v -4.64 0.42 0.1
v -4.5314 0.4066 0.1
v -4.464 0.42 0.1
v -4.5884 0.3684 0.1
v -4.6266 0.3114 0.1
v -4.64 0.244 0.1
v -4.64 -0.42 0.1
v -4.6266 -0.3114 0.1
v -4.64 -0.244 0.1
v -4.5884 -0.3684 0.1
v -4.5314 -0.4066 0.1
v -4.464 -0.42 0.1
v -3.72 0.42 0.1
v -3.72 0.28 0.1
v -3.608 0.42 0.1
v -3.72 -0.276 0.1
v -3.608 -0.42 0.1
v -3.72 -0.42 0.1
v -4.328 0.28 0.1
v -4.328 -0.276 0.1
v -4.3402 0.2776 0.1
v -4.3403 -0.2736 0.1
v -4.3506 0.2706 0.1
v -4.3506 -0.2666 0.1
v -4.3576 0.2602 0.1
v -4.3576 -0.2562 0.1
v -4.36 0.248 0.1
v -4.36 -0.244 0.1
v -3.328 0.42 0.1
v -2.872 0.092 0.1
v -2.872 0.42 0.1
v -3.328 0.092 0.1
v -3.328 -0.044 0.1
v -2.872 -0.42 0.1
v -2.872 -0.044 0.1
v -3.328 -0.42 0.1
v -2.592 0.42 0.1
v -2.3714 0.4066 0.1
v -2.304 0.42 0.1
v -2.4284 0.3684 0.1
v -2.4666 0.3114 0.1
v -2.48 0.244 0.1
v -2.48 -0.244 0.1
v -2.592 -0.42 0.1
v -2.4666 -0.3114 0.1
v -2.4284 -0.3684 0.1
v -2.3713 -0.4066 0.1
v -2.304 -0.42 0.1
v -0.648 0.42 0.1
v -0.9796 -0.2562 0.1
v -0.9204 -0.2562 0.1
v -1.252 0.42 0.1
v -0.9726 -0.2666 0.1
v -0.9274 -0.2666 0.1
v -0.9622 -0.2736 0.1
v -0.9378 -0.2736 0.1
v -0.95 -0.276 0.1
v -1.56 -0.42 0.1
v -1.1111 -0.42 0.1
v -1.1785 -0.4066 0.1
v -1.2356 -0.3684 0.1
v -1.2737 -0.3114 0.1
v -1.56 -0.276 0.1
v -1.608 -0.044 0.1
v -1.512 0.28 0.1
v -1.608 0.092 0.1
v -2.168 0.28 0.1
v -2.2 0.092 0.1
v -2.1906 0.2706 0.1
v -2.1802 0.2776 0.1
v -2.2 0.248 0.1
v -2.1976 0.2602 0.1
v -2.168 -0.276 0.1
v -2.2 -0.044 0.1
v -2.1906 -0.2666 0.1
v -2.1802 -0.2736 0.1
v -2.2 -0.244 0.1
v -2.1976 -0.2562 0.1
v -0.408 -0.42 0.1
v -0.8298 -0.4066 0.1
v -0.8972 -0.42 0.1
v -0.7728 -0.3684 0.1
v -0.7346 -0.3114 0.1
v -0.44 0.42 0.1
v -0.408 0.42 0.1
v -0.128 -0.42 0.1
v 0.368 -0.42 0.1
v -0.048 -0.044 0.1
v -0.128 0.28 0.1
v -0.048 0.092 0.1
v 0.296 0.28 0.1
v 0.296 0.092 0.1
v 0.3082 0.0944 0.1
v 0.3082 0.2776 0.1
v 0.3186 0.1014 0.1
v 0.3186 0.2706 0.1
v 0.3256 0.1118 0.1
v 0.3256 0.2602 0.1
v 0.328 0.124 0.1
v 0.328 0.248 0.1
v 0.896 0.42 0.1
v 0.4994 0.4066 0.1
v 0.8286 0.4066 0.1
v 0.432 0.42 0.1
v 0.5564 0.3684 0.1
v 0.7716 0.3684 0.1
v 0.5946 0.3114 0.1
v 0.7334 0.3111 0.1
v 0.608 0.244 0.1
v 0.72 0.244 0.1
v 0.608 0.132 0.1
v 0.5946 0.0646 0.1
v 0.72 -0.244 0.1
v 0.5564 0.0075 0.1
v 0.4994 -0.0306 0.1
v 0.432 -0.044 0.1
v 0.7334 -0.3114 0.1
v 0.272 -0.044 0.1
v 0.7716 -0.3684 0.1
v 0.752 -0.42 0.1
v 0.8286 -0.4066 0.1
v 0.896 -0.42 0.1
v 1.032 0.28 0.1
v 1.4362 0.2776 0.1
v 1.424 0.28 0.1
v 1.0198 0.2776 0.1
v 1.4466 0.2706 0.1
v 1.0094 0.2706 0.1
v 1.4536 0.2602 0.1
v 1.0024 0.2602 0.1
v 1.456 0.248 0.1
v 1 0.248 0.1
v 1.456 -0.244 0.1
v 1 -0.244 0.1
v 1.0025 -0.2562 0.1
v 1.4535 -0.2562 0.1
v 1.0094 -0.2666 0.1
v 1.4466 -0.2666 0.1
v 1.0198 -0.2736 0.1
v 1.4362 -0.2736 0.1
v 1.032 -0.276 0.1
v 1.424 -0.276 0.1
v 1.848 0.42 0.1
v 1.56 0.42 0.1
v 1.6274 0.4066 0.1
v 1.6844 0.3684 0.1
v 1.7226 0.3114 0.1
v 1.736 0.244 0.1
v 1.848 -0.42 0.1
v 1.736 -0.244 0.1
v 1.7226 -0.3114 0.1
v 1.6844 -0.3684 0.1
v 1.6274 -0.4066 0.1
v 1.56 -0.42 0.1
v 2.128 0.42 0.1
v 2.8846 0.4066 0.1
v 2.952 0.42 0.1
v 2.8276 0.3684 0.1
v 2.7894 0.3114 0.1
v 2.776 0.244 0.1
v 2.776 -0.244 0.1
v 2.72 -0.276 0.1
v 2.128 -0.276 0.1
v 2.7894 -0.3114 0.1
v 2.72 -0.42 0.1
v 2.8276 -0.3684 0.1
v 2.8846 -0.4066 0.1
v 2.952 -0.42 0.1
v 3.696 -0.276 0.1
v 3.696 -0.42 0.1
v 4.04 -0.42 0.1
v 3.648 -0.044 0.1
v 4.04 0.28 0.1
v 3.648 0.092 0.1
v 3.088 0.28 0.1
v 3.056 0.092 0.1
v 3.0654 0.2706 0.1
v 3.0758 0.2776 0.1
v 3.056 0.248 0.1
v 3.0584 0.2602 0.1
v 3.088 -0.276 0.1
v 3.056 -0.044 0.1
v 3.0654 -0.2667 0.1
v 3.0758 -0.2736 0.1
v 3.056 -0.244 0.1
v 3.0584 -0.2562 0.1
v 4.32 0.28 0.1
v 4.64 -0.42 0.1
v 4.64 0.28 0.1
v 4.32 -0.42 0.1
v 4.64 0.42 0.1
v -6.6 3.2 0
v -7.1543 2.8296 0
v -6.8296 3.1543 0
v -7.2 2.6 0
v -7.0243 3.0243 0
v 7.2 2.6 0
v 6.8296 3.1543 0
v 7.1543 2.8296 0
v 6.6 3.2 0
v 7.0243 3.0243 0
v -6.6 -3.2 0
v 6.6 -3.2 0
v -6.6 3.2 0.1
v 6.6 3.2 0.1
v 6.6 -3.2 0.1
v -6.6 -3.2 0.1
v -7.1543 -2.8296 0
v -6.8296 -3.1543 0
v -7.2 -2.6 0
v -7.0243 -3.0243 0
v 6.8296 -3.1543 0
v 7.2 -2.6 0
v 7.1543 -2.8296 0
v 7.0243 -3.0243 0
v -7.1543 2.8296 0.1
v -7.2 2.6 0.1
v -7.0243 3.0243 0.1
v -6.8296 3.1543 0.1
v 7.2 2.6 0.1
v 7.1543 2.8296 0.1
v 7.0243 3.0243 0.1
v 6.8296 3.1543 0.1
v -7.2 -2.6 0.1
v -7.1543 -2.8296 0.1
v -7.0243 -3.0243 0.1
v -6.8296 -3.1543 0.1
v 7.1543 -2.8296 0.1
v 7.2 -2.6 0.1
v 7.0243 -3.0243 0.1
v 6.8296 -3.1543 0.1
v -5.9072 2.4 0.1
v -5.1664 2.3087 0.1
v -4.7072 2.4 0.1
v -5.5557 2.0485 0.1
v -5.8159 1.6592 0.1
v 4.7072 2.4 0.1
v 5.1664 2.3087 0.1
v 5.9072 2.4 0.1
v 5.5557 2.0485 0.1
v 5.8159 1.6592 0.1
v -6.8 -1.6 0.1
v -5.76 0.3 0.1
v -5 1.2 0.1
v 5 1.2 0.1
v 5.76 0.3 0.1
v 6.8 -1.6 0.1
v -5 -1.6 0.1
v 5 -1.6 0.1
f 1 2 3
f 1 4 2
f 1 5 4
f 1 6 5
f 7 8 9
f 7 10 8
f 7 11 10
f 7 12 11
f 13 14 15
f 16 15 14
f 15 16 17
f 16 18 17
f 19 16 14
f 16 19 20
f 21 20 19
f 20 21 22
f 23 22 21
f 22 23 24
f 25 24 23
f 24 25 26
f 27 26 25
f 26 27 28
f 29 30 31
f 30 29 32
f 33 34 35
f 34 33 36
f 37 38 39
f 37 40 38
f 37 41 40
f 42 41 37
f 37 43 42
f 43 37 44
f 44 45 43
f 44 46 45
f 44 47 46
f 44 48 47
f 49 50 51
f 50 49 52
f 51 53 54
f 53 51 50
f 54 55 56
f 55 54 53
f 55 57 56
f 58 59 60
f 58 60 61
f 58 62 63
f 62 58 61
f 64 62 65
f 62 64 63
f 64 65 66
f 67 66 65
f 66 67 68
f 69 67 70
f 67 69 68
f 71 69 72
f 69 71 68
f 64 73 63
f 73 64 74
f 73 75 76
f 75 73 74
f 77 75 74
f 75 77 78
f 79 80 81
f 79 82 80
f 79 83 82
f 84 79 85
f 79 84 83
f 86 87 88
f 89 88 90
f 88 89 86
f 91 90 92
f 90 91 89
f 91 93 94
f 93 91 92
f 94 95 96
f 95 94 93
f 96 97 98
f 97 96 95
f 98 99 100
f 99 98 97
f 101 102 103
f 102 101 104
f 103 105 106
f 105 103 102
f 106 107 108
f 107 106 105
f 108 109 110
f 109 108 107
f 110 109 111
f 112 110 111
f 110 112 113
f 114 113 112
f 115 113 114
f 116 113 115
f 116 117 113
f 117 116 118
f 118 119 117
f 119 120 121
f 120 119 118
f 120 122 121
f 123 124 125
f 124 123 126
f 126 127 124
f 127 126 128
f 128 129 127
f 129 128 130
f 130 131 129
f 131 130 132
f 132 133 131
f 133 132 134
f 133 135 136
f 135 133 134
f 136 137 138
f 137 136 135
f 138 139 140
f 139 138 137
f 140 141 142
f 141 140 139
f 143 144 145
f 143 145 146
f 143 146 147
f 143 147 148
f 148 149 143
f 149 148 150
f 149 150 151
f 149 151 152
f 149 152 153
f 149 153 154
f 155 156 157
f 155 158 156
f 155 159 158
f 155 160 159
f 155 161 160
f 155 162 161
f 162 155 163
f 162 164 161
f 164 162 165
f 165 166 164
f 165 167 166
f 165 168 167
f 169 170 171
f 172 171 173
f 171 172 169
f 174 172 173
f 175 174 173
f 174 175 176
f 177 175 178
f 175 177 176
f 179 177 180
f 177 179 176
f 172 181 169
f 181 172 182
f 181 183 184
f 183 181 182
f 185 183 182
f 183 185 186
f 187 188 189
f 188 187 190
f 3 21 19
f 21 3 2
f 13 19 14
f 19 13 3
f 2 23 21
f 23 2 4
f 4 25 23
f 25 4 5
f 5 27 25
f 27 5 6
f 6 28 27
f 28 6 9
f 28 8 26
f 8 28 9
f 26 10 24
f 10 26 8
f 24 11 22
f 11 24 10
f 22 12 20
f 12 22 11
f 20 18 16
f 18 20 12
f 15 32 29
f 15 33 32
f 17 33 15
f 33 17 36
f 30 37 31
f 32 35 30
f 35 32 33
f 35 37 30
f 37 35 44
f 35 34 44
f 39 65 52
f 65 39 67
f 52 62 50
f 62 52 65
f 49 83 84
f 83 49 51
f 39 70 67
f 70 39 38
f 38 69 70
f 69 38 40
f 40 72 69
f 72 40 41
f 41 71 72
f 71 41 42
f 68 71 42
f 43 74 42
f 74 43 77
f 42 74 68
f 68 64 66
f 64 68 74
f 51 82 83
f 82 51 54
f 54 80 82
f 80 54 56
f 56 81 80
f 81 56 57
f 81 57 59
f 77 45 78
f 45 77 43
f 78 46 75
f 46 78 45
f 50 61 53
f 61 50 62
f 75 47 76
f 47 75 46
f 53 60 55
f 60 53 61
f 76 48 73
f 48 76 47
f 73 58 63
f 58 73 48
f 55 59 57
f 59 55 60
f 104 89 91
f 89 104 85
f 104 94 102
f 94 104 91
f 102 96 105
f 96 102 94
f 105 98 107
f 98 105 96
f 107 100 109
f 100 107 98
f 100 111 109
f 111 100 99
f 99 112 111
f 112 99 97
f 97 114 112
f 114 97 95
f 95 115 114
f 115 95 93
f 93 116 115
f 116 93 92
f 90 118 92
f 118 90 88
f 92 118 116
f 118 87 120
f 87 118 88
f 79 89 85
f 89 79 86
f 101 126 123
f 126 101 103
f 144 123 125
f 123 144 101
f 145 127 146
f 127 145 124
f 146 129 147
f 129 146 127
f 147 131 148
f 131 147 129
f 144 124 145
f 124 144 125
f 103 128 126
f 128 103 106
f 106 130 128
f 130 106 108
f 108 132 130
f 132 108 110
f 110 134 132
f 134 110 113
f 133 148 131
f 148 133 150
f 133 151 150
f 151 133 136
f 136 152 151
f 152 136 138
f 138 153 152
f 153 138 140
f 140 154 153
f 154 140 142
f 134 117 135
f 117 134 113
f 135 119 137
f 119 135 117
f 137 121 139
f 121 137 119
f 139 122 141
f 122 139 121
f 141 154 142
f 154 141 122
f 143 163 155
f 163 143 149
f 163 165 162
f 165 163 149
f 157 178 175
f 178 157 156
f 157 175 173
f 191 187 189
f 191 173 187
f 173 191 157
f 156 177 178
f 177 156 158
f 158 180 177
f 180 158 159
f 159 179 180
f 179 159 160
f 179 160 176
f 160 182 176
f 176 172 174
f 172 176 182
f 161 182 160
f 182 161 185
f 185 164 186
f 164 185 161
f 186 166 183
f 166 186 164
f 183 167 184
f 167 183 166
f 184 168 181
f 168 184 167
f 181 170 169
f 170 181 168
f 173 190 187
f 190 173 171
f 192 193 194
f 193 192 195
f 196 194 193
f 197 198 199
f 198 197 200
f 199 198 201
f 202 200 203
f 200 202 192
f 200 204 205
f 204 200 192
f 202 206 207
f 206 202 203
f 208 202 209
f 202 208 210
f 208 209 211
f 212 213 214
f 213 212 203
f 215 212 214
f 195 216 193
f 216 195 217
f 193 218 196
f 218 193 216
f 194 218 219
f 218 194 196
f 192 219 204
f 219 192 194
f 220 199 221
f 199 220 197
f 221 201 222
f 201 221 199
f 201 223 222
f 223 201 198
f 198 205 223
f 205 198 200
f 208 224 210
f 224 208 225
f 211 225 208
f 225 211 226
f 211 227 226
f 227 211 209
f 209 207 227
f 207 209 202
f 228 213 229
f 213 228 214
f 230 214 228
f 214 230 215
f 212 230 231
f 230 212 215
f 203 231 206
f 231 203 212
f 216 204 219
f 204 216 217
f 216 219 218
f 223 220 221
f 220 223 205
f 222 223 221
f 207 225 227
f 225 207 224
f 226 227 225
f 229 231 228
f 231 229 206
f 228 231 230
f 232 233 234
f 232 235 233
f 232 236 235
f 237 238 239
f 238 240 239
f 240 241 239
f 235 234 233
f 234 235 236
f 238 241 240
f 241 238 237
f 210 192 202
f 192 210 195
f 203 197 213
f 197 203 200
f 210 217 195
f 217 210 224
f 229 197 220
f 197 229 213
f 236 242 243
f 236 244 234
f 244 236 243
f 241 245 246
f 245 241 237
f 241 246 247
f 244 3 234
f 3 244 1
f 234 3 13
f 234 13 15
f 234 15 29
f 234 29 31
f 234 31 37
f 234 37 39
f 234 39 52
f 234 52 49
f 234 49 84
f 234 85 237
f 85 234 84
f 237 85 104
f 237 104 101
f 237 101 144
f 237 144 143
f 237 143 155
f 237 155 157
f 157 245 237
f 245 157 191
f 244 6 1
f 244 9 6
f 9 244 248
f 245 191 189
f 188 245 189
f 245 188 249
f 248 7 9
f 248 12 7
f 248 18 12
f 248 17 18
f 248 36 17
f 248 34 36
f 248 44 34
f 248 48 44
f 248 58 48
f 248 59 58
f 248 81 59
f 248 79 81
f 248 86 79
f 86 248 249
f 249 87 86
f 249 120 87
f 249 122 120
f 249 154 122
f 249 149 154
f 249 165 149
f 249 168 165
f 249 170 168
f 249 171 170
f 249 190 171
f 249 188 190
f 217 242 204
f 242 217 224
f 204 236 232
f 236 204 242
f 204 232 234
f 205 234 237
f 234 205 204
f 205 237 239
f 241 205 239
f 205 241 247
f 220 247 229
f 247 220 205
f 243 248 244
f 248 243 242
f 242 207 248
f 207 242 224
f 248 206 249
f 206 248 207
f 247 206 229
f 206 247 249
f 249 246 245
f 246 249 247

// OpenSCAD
// file: ../p/box3u12.scad
use <../lib.scad>
function ldraw_lib__box3u12() = [
// 0 Box with 3 Parallel Faces without Any Edges
// 0 Name: box3u12.dat
// 0 Author: J.C. Tchang [tchang]
// 0 !LDRAW_ORG Primitive UPDATE 2014-02
// 0 !LICENSE Licensed under CC BY 4.0 : see CAreadme.txt
// 
// 0 BFC CERTIFY CCW
  [0,"BFC","CERTIFY"],
  [0,"BFC","CCW"],
// 
// 0 !HISTORY 2014-12-23 [PTadmin] Official Update 2014-02
// 
// 
// 4 16 -1 1 1 1 1 1 1 1 -1 -1 1 -1
  [4,16,-1,1,1,1,1,1,1,1,-1,-1,1,-1],
// 4 16 -1 1 1 -1 0 1 1 0 1 1 1 1
  [4,16,-1,1,1,-1,0,1,1,0,1,1,1,1],
// 4 16 1 1 -1 1 0 -1 -1 0 -1 -1 1 -1
  [4,16,1,1,-1,1,0,-1,-1,0,-1,-1,1,-1],
];
module ldraw_lib__box3u12(step=0, col=false, unit=2/5, alt=false, line=0.2, solid=!$preview)
    makepoly(ldraw_lib__box3u12(), step=step, col=col, unit=unit, alt=alt, line=line, solid=solid);
ldraw_lib__box3u12(line=0.2);
// file: ../p/3-16ndis.scad
use <../lib.scad>
function ldraw_lib__3_16ndis() = [
// 0 Disc Negative 0.1875
// 0 Name: 3-16ndis.dat
// 0 Author: Guy Vivan [guyvivan]
// 0 !LDRAW_ORG Primitive UPDATE 2009-01
// 0 !LICENSE Licensed under CC BY 2.0 and CC BY 4.0 : see CAreadme.txt
// 
// 0 BFC CERTIFY CCW
  [0,"BFC","CERTIFY"],
  [0,"BFC","CCW"],
// 
// 0 !HISTORY 2009-05-02 [PTadmin] Official Update 2009-01
// 
// 
// 3 16 1 0 1 0.9239 0 0.3827 1 0 0
  [3,16,1,0,1,0.9239,0,0.3827,1,0,0],
// 3 16 1 0 1 0.7071 0 0.7071 0.9239 0 0.3827
  [3,16,1,0,1,0.7071,0,0.7071,0.9239,0,0.3827],
// 3 16 1 0 1 0.3827 0 0.9239 0.7071 0 0.7071
  [3,16,1,0,1,0.3827,0,0.9239,0.7071,0,0.7071],
// 
// 0 end of file
// 
];
module ldraw_lib__3_16ndis(step=0, col=false, unit=2/5, alt=false, line=0.2, solid=!$preview)
    makepoly(ldraw_lib__3_16ndis(), step=step, col=col, unit=unit, alt=alt, line=line, solid=solid);
ldraw_lib__3_16ndis(line=0.2);
// file: ../p/3-16chrd.scad
use <../lib.scad>
function ldraw_lib__3_16chrd() = [
// 0 Chord 0.1875
// 0 Name: 3-16chrd.dat
// 0 Author: Niels Karsdorp [nielsk]
// 0 !LDRAW_ORG Primitive UPDATE 2009-01
// 0 !LICENSE Licensed under CC BY 4.0 : see CAreadme.txt
// 
// 0 BFC CERTIFY CCW
  [0,"BFC","CERTIFY"],
  [0,"BFC","CCW"],
// 
// 0 !HISTORY 2009-05-02 [PTadmin] Official Update 2009-01
// 
// 
// 4 16 1 0 0 0.9239 0 0.3827 0.7071 0 0.7071 0.3827 0 0.9239
  [4,16,1,0,0,0.9239,0,0.3827,0.7071,0,0.7071,0.3827,0,0.9239],
// 0
// 
];
module ldraw_lib__3_16chrd(step=0, col=false, unit=2/5, alt=false, line=0.2, solid=!$preview)
    makepoly(ldraw_lib__3_16chrd(), step=step, col=col, unit=unit, alt=alt, line=line, solid=solid);
ldraw_lib__3_16chrd(line=0.2);
// file: ../p/1-4cyli.scad
use <../lib.scad>
function ldraw_lib__1_4cyli() = [
// 0 Cylinder 0.25
// 0 Name: 1-4cyli.dat
// 0 Author: James Jessiman
// 0 !LDRAW_ORG Primitive UPDATE 2012-01
// 0 !LICENSE Licensed under CC BY 4.0 : see CAreadme.txt
// 
// 0 BFC CERTIFY CCW
  [0,"BFC","CERTIFY"],
  [0,"BFC","CCW"],
// 
// 0 !HISTORY 2002-03-23 [sbliss] Added BFC statement.
// 0 !HISTORY 2002-04-25 [PTadmin] Official Update 2002-02
// 0 !HISTORY 2007-06-22 [PTadmin] Header formatted for Contributor Agreement
// 0 !HISTORY 2008-07-01 [PTadmin] Official Update 2008-01
// 0 !HISTORY 2012-02-16 [Philo] Changed to CCW
// 0 !HISTORY 2012-03-30 [PTadmin] Official Update 2012-01
// 
// 
// 4 16 1 1 0 0.9239 1 0.3827 0.9239 0 0.3827 1 0 0
  [4,16,1,1,0,0.9239,1,0.3827,0.9239,0,0.3827,1,0,0],
// 5 24 1 0 0 1 1 0 0.9239 0 0.3827 1 0 -1
  [5,24,1,0,0,1,1,0,0.9239,0,0.3827,1,0,-1],
// 4 16 0.9239 1 0.3827 0.7071 1 0.7071 0.7071 0 0.7071 0.9239 0 0.3827
  [4,16,0.9239,1,0.3827,0.7071,1,0.7071,0.7071,0,0.7071,0.9239,0,0.3827],
// 5 24 0.9239 0 0.3827 0.9239 1 0.3827 0.7071 0 0.7071 1 0 0
  [5,24,0.9239,0,0.3827,0.9239,1,0.3827,0.7071,0,0.7071,1,0,0],
// 4 16 0.7071 1 0.7071 0.3827 1 0.9239 0.3827 0 0.9239 0.7071 0 0.7071
  [4,16,0.7071,1,0.7071,0.3827,1,0.9239,0.3827,0,0.9239,0.7071,0,0.7071],
// 5 24 0.7071 0 0.7071 0.7071 1 0.7071 0.3827 0 0.9239 0.9239 0 0.3827
  [5,24,0.7071,0,0.7071,0.7071,1,0.7071,0.3827,0,0.9239,0.9239,0,0.3827],
// 4 16 0.3827 1 0.9239 0 1 1 0 0 1 0.3827 0 0.9239
  [4,16,0.3827,1,0.9239,0,1,1,0,0,1,0.3827,0,0.9239],
// 5 24 0.3827 0 0.9239 0.3827 1 0.9239 0 0 1 0.7071 0 0.7071
  [5,24,0.3827,0,0.9239,0.3827,1,0.9239,0,0,1,0.7071,0,0.7071],
// 5 24 0 0 1 0 1 1 0.3827 0 0.9239 -1 0 1
  [5,24,0,0,1,0,1,1,0.3827,0,0.9239,-1,0,1],
];
module ldraw_lib__1_4cyli(step=0, col=false, unit=2/5, alt=false, line=0.2, solid=!$preview)
    makepoly(ldraw_lib__1_4cyli(), step=step, col=col, unit=unit, alt=alt, line=line, solid=solid);
ldraw_lib__1_4cyli(line=0.2);
// file: ../p/1-4chrd.scad
use <../lib.scad>
function ldraw_lib__1_4chrd() = [
// 0 Chord 0.25
// 0 Name: 1-4chrd.dat
// 0 Author: Max Martin Richter [MMR1988]
// 0 !LDRAW_ORG Primitive UPDATE 2023-05
// 0 !LICENSE Licensed under CC BY 4.0 : see CAreadme.txt
// 
// 0 BFC CERTIFY CCW
  [0,"BFC","CERTIFY"],
  [0,"BFC","CCW"],
// 
// 0 !HISTORY 2004-04-22 [PTadmin] Official Update 2004-02
// 0 !HISTORY 2007-10-09 [PTadmin] Header formatted for Contributor Agreement
// 0 !HISTORY 2008-07-01 [PTadmin] Official Update 2008-01
// 0 !HISTORY 2012-08-02 [MMR1988] Re-creation with PrimGen2 and Rectifier
// 0 !HISTORY 2012-08-09 [PTadmin] Official Update 2012-02
// 0 !HISTORY 2023-10-27 [OrionP] Change author to MMR1988 from hafhead
// 0 !HISTORY 2023-10-31 [OrionP] Official Update 2023-05
// 
// 4 16 0.9239 0 0.3827 0.3827 0 0.9239 0 0 1 1 0 0
  [4,16,0.9239,0,0.3827,0.3827,0,0.9239,0,0,1,1,0,0],
// 3 16 0.7071 0 0.7071 0.3827 0 0.9239 0.9239 0 0.3827
  [3,16,0.7071,0,0.7071,0.3827,0,0.9239,0.9239,0,0.3827],
];
module ldraw_lib__1_4chrd(step=0, col=false, unit=2/5, alt=false, line=0.2, solid=!$preview)
    makepoly(ldraw_lib__1_4chrd(), step=step, col=col, unit=unit, alt=alt, line=line, solid=solid);
ldraw_lib__1_4chrd(line=0.2);
// main file
use <../lib.scad>
use <../p/1-4chrd.scad>
use <../p/1-4cyli.scad>
use <../p/3-16chrd.scad>
use <../p/3-16ndis.scad>
use <../p/box3u12.scad>
use <../p/logo-chevrolet-text-box.scad>
use <../p/logo-chevrolet-text.scad>
function ldraw_lib__6142617r() = [
// 0 Sticker  0.9 x  1.8 with Silver "Chevrolet" in Black Frame on Red Background
// 0 Name: 6142617r.dat
// 0 Author: Massimo Maso [Sirio]
// 0 !LDRAW_ORG Part UPDATE 2023-05
// 0 !LICENSE Licensed under CC BY 4.0 : see CAreadme.txt
// 
// 0 BFC CERTIFY CCW
  [0,"BFC","CERTIFY"],
  [0,"BFC","CCW"],
// 
// 0 !KEYWORDS Camaro, Drag, Race, Set 75874, Speed Champions, SS
// 
// 0 !HISTORY 2023-10-31 [OrionP] Official Update 2023-05
// 
// 
// 1 0 0 -.25 0 .4 0 0 0 1 0 0 0 .4 logo-chevrolet-text-box.dat
  [1,0,0,-.25,0,.4,0,0,0,1,0,0,0,.4, ldraw_lib__logo_chevrolet_text_box()],
// 1 80 0 -.25 0 .4 0 0 0 1 0 0 0 .4 logo-chevrolet-text.dat
  [1,80,0,-.25,0,.4,0,0,0,1,0,0,0,.4, ldraw_lib__logo_chevrolet_text()],
// 0 // Primitives
// 1 16 -16.5 0 6.5 -1.5 0 0 0 -1 0 0 0 1.5 1-4chrd.dat
  [1,16,-16.5,0,6.5,-1.5,0,0,0,-1,0,0,0,1.5, ldraw_lib__1_4chrd()],
// 1 16 16.5 0 6.5 1.5 0 0 0 -1 0 0 0 1.5 1-4chrd.dat
  [1,16,16.5,0,6.5,1.5,0,0,0,-1,0,0,0,1.5, ldraw_lib__1_4chrd()],
// 1 16 0 -.25 0 16.5 0 0 0 .25 0 0 0 8 box3u12.dat
  [1,16,0,-.25,0,16.5,0,0,0,.25,0,0,0,8, ldraw_lib__box3u12()],
// 1 16 -16.5 0 -6.5 -1.5 0 0 0 -1 0 0 0 -1.5 1-4chrd.dat
  [1,16,-16.5,0,-6.5,-1.5,0,0,0,-1,0,0,0,-1.5, ldraw_lib__1_4chrd()],
// 1 16 16.5 0 -6.5 1.5 0 0 0 -1 0 0 0 -1.5 1-4chrd.dat
  [1,16,16.5,0,-6.5,1.5,0,0,0,-1,0,0,0,-1.5, ldraw_lib__1_4chrd()],
// 1 16 -16.5 0 6.5 -1.5 0 0 0 -.25 0 0 0 1.5 1-4cyli.dat
  [1,16,-16.5,0,6.5,-1.5,0,0,0,-.25,0,0,0,1.5, ldraw_lib__1_4cyli()],
// 1 16 16.5 0 6.5 1.5 0 0 0 -.25 0 0 0 1.5 1-4cyli.dat
  [1,16,16.5,0,6.5,1.5,0,0,0,-.25,0,0,0,1.5, ldraw_lib__1_4cyli()],
// 1 16 -16.5 0 -6.5 -1.5 0 0 0 -.25 0 0 0 -1.5 1-4cyli.dat
  [1,16,-16.5,0,-6.5,-1.5,0,0,0,-.25,0,0,0,-1.5, ldraw_lib__1_4cyli()],
// 1 16 16.5 0 -6.5 1.5 0 0 0 -.25 0 0 0 -1.5 1-4cyli.dat
  [1,16,16.5,0,-6.5,1.5,0,0,0,-.25,0,0,0,-1.5, ldraw_lib__1_4cyli()],
// 1 4 -16.5 -.25 6.5 -1.5 0 0 0 1 0 0 0 1.5 1-4chrd.dat
  [1,4,-16.5,-.25,6.5,-1.5,0,0,0,1,0,0,0,1.5, ldraw_lib__1_4chrd()],
// 1 4 16.5 -.25 6.5 1.5 0 0 0 1 0 0 0 1.5 1-4chrd.dat
  [1,4,16.5,-.25,6.5,1.5,0,0,0,1,0,0,0,1.5, ldraw_lib__1_4chrd()],
// 1 4 -16.5 -.25 -6.5 -1.5 0 0 0 1 0 0 0 -1.5 1-4chrd.dat
  [1,4,-16.5,-.25,-6.5,-1.5,0,0,0,1,0,0,0,-1.5, ldraw_lib__1_4chrd()],
// 1 4 16.5 -.25 -6.5 1.5 0 0 0 1 0 0 0 -1.5 1-4chrd.dat
  [1,4,16.5,-.25,-6.5,1.5,0,0,0,1,0,0,0,-1.5, ldraw_lib__1_4chrd()],
// 1 4 -11.768 -.25 3 0 0 -3 0 1 0 3 0 0 3-16ndis.dat
  [1,4,-11.768,-.25,3,0,0,-3,0,1,0,3,0,0, ldraw_lib__3_16ndis()],
// 1 4 11.768 -.25 3 0 0 3 0 1 0 3 0 0 3-16ndis.dat
  [1,4,11.768,-.25,3,0,0,3,0,1,0,3,0,0, ldraw_lib__3_16ndis()],
// 1 0 -11.768 -.25 3 0 0 -3 0 1 0 3 0 0 3-16chrd.dat
  [1,0,-11.768,-.25,3,0,0,-3,0,1,0,3,0,0, ldraw_lib__3_16chrd()],
// 1 0 11.768 -.25 3 0 0 3 0 1 0 3 0 0 3-16chrd.dat
  [1,0,11.768,-.25,3,0,0,3,0,1,0,3,0,0, ldraw_lib__3_16chrd()],
// 0 // Bottom face
// 4 16 -16.5 0 8 -16.5 0 -8 -18 0 -6.5 -18 0 6.5
  [4,16,-16.5,0,8,-16.5,0,-8,-18,0,-6.5,-18,0,6.5],
// 4 16 16.5 0 8 18 0 6.5 18 0 -6.5 16.5 0 -8
  [4,16,16.5,0,8,18,0,6.5,18,0,-6.5,16.5,0,-8],
// 0 // Lateral face
// 4 16 -18 0 6.5 -18 0 -6.5 -18 -.25 -6.5 -18 -.25 6.5
  [4,16,-18,0,6.5,-18,0,-6.5,-18,-.25,-6.5,-18,-.25,6.5],
// 4 16 18 0 6.5 18 -.25 6.5 18 -.25 -6.5 18 0 -6.5
  [4,16,18,0,6.5,18,-.25,6.5,18,-.25,-6.5,18,0,-6.5],
// 0 // Top face
// 0 // Black faces
// 3 0 -14.5397 -.25 4.1481 -17 -.25 -4 -14.4 -.25 .75
  [3,0,-14.5397,-.25,4.1481,-17,-.25,-4,-14.4,-.25,.75],
// 4 0 -14.5397 -.25 4.1481 -14.4 -.25 .75 -12.5 -.25 3 -11.768 -.25 6
  [4,0,-14.5397,-.25,4.1481,-14.4,-.25,.75,-12.5,-.25,3,-11.768,-.25,6],
// 4 0 14.5397 -.25 4.1481 11.768 -.25 6 12.5 -.25 3 14.4 -.25 .75
  [4,0,14.5397,-.25,4.1481,11.768,-.25,6,12.5,-.25,3,14.4,-.25,.75],
// 3 0 14.5397 -.25 4.1481 14.4 -.25 .75 17 -.25 -4
  [3,0,14.5397,-.25,4.1481,14.4,-.25,.75,17,-.25,-4],
// 4 0 -11.768 -.25 6 -12.5 -.25 3 -11.6 -.25 1.05 -11.16 -.25 1.05
  [4,0,-11.768,-.25,6,-12.5,-.25,3,-11.6,-.25,1.05,-11.16,-.25,1.05],
// 3 0 -11.768 -.25 6 -11.16 -.25 1.05 -9.3 -.25 1.05
  [3,0,-11.768,-.25,6,-11.16,-.25,1.05,-9.3,-.25,1.05],
// 3 0 -11.768 -.25 6 -9.3 -.25 1.05 -9.02 -.25 1.05
  [3,0,-11.768,-.25,6,-9.3,-.25,1.05,-9.02,-.25,1.05],
// 3 0 -11.768 -.25 6 -9.02 -.25 1.05 -8.32 -.25 1.05
  [3,0,-11.768,-.25,6,-9.02,-.25,1.05,-8.32,-.25,1.05],
// 3 0 -11.768 -.25 6 -8.32 -.25 1.05 -7.18 -.25 1.05
  [3,0,-11.768,-.25,6,-8.32,-.25,1.05,-7.18,-.25,1.05],
// 3 0 -11.768 -.25 6 -7.18 -.25 1.05 -6.48 -.25 1.05
  [3,0,-11.768,-.25,6,-7.18,-.25,1.05,-6.48,-.25,1.05],
// 3 0 -11.768 -.25 6 -6.48 -.25 1.05 -5.76 -.25 1.05
  [3,0,-11.768,-.25,6,-6.48,-.25,1.05,-5.76,-.25,1.05],
// 3 0 -11.768 -.25 6 -5.76 -.25 1.05 -3.13 -.25 1.05
  [3,0,-11.768,-.25,6,-5.76,-.25,1.05,-3.13,-.25,1.05],
// 3 0 -11.768 -.25 6 -3.13 -.25 1.05 -1.62 -.25 1.05
  [3,0,-11.768,-.25,6,-3.13,-.25,1.05,-1.62,-.25,1.05],
// 3 0 -11.768 -.25 6 -1.62 -.25 1.05 -1.1 -.25 1.05
  [3,0,-11.768,-.25,6,-1.62,-.25,1.05,-1.1,-.25,1.05],
// 4 0 -11.768 -.25 6 -1.1 -.25 1.05 -1.02 -.25 1.05 11.768 -.25 6
  [4,0,-11.768,-.25,6,-1.1,-.25,1.05,-1.02,-.25,1.05,11.768,-.25,6],
// 3 0 11.768 -.25 6 -1.02 -.25 1.05 1.08 -.25 1.05
  [3,0,11.768,-.25,6,-1.02,-.25,1.05,1.08,-.25,1.05],
// 3 0 11.768 -.25 6 1.08 -.25 1.05 2.24 -.25 1.05
  [3,0,11.768,-.25,6,1.08,-.25,1.05,2.24,-.25,1.05],
// 3 0 11.768 -.25 6 2.24 -.25 1.05 3.9 -.25 1.05
  [3,0,11.768,-.25,6,2.24,-.25,1.05,3.9,-.25,1.05],
// 3 0 11.768 -.25 6 3.9 -.25 1.05 4.62 -.25 1.05
  [3,0,11.768,-.25,6,3.9,-.25,1.05,4.62,-.25,1.05],
// 3 0 11.768 -.25 6 4.62 -.25 1.05 5.32 -.25 1.05
  [3,0,11.768,-.25,6,4.62,-.25,1.05,5.32,-.25,1.05],
// 3 0 11.768 -.25 6 5.32 -.25 1.05 7.38 -.25 1.05
  [3,0,11.768,-.25,6,5.32,-.25,1.05,7.38,-.25,1.05],
// 4 0 11.768 -.25 6 7.38 -.25 1.05 11.6 -.25 1.05 12.5 -.25 3
  [4,0,11.768,-.25,6,7.38,-.25,1.05,11.6,-.25,1.05,12.5,-.25,3],
// 3 0 -12.5 -.25 3 -11.6 -.25 .61 -11.6 -.25 1.05
  [3,0,-12.5,-.25,3,-11.6,-.25,.61,-11.6,-.25,1.05],
// 4 0 -12.5 -.25 3 -12.5 -.25 -4 -11.6 -.25 -.61 -11.6 -.25 .61
  [4,0,-12.5,-.25,3,-12.5,-.25,-4,-11.6,-.25,-.61,-11.6,-.25,.61],
// 3 0 12.5 -.25 3 11.6 -.25 1.05 11.6 -.25 .7
  [3,0,12.5,-.25,3,11.6,-.25,1.05,11.6,-.25,.7],
// 4 0 12.5 -.25 3 11.6 -.25 .7 11.6 -.25 -1.05 12.5 -.25 -4
  [4,0,12.5,-.25,3,11.6,-.25,.7,11.6,-.25,-1.05,12.5,-.25,-4],
// 3 0 -12.5 -.25 -4 -11.6 -.25 -1.05 -11.6 -.25 -.61
  [3,0,-12.5,-.25,-4,-11.6,-.25,-1.05,-11.6,-.25,-.61],
// 3 0 -12.5 -.25 -4 -11.16 -.25 -1.05 -11.6 -.25 -1.05
  [3,0,-12.5,-.25,-4,-11.16,-.25,-1.05,-11.6,-.25,-1.05],
// 3 0 -12.5 -.25 -4 -9.3 -.25 -1.05 -11.16 -.25 -1.05
  [3,0,-12.5,-.25,-4,-9.3,-.25,-1.05,-11.16,-.25,-1.05],
// 3 0 -12.5 -.25 -4 -9.02 -.25 -1.05 -9.3 -.25 -1.05
  [3,0,-12.5,-.25,-4,-9.02,-.25,-1.05,-9.3,-.25,-1.05],
// 3 0 -12.5 -.25 -4 -8.32 -.25 -1.05 -9.02 -.25 -1.05
  [3,0,-12.5,-.25,-4,-8.32,-.25,-1.05,-9.02,-.25,-1.05],
// 3 0 -12.5 -.25 -4 -7.18 -.25 -1.05 -8.32 -.25 -1.05
  [3,0,-12.5,-.25,-4,-7.18,-.25,-1.05,-8.32,-.25,-1.05],
// 3 0 -12.5 -.25 -4 -6.48 -.25 -1.05 -7.18 -.25 -1.05
  [3,0,-12.5,-.25,-4,-6.48,-.25,-1.05,-7.18,-.25,-1.05],
// 3 0 -12.5 -.25 -4 -5.76 -.25 -1.05 -6.48 -.25 -1.05
  [3,0,-12.5,-.25,-4,-5.76,-.25,-1.05,-6.48,-.25,-1.05],
// 3 0 -12.5 -.25 -4 -3.9 -.25 -1.05 -5.76 -.25 -1.05
  [3,0,-12.5,-.25,-4,-3.9,-.25,-1.05,-5.76,-.25,-1.05],
// 3 0 -12.5 -.25 -4 -2.7778 -.25 -1.05 -3.9 -.25 -1.05
  [3,0,-12.5,-.25,-4,-2.7778,-.25,-1.05,-3.9,-.25,-1.05],
// 3 0 -12.5 -.25 -4 -2.243 -.25 -1.05 -2.7778 -.25 -1.05
  [3,0,-12.5,-.25,-4,-2.243,-.25,-1.05,-2.7778,-.25,-1.05],
// 3 0 -12.5 -.25 -4 -1.02 -.25 -1.05 -2.243 -.25 -1.05
  [3,0,-12.5,-.25,-4,-1.02,-.25,-1.05,-2.243,-.25,-1.05],
// 4 0 -12.5 -.25 -4 12.5 -.25 -4 -.32 -.25 -1.05 -1.02 -.25 -1.05
  [4,0,-12.5,-.25,-4,12.5,-.25,-4,-.32,-.25,-1.05,-1.02,-.25,-1.05],
// 3 0 12.5 -.25 -4 .92 -.25 -1.05 -.32 -.25 -1.05
  [3,0,12.5,-.25,-4,.92,-.25,-1.05,-.32,-.25,-1.05],
// 3 0 12.5 -.25 -4 1.88 -.25 -1.05 .92 -.25 -1.05
  [3,0,12.5,-.25,-4,1.88,-.25,-1.05,.92,-.25,-1.05],
// 3 0 12.5 -.25 -4 2.24 -.25 -1.05 1.88 -.25 -1.05
  [3,0,12.5,-.25,-4,2.24,-.25,-1.05,1.88,-.25,-1.05],
// 3 0 12.5 -.25 -4 3.9 -.25 -1.05 2.24 -.25 -1.05
  [3,0,12.5,-.25,-4,3.9,-.25,-1.05,2.24,-.25,-1.05],
// 3 0 12.5 -.25 -4 4.62 -.25 -1.05 3.9 -.25 -1.05
  [3,0,12.5,-.25,-4,4.62,-.25,-1.05,3.9,-.25,-1.05],
// 3 0 12.5 -.25 -4 6.8 -.25 -1.05 4.62 -.25 -1.05
  [3,0,12.5,-.25,-4,6.8,-.25,-1.05,4.62,-.25,-1.05],
// 3 0 12.5 -.25 -4 7.38 -.25 -1.05 6.8 -.25 -1.05
  [3,0,12.5,-.25,-4,7.38,-.25,-1.05,6.8,-.25,-1.05],
// 3 0 12.5 -.25 -4 9.24 -.25 -1.05 7.38 -.25 -1.05
  [3,0,12.5,-.25,-4,9.24,-.25,-1.05,7.38,-.25,-1.05],
// 3 0 12.5 -.25 -4 10.1 -.25 -1.05 9.24 -.25 -1.05
  [3,0,12.5,-.25,-4,10.1,-.25,-1.05,9.24,-.25,-1.05],
// 3 0 12.5 -.25 -4 10.8 -.25 -1.05 10.1 -.25 -1.05
  [3,0,12.5,-.25,-4,10.8,-.25,-1.05,10.1,-.25,-1.05],
// 3 0 12.5 -.25 -4 11.6 -.25 -1.05 10.8 -.25 -1.05
  [3,0,12.5,-.25,-4,11.6,-.25,-1.05,10.8,-.25,-1.05],
// 0 // Red faces
// 4 4 -16.5 -.25 8 -18 -.25 6.5 -18 -.25 -6.5 -17 -.25 -4
  [4,4,-16.5,-.25,8,-18,-.25,6.5,-18,-.25,-6.5,-17,-.25,-4],
// 4 4 -16.5 -.25 8 -17 -.25 -4 -14.5397 -.25 4.1481 -14.768 -.25 6
  [4,4,-16.5,-.25,8,-17,-.25,-4,-14.5397,-.25,4.1481,-14.768,-.25,6],
// 3 4 -16.5 -.25 8 -14.768 -.25 6 -11.768 -.25 6
  [3,4,-16.5,-.25,8,-14.768,-.25,6,-11.768,-.25,6],
// 4 4 -16.5 -.25 8 -11.768 -.25 6 11.768 -.25 6 16.5 -.25 8
  [4,4,-16.5,-.25,8,-11.768,-.25,6,11.768,-.25,6,16.5,-.25,8],
// 3 4 16.5 -.25 8 11.768 -.25 6 14.768 -.25 6
  [3,4,16.5,-.25,8,11.768,-.25,6,14.768,-.25,6],
// 4 4 16.5 -.25 8 14.768 -.25 6 14.5397 -.25 4.1481 17 -.25 -4
  [4,4,16.5,-.25,8,14.768,-.25,6,14.5397,-.25,4.1481,17,-.25,-4],
// 4 4 16.5 -.25 8 17 -.25 -4 18 -.25 -6.5 18 -.25 6.5
  [4,4,16.5,-.25,8,17,-.25,-4,18,-.25,-6.5,18,-.25,6.5],
// 4 4 -12.5 -.25 -4 -12.5 -.25 3 -14.4 -.25 .75 -17 -.25 -4
  [4,4,-12.5,-.25,-4,-12.5,-.25,3,-14.4,-.25,.75,-17,-.25,-4],
// 4 4 -12.5 -.25 -4 -17 -.25 -4 -18 -.25 -6.5 -16.5 -.25 -8
  [4,4,-12.5,-.25,-4,-17,-.25,-4,-18,-.25,-6.5,-16.5,-.25,-8],
// 4 4 -12.5 -.25 -4 -16.5 -.25 -8 16.5 -.25 -8 12.5 -.25 -4
  [4,4,-12.5,-.25,-4,-16.5,-.25,-8,16.5,-.25,-8,12.5,-.25,-4],
// 4 4 12.5 -.25 -4 16.5 -.25 -8 18 -.25 -6.5 17 -.25 -4
  [4,4,12.5,-.25,-4,16.5,-.25,-8,18,-.25,-6.5,17,-.25,-4],
// 4 4 12.5 -.25 -4 17 -.25 -4 14.4 -.25 .75 12.5 -.25 3
  [4,4,12.5,-.25,-4,17,-.25,-4,14.4,-.25,.75,12.5,-.25,3],
];
module ldraw_lib__6142617r(step=0, col=false, unit=2/5, alt=false, line=0.2, solid=!$preview)
    makepoly(ldraw_lib__6142617r(), step=step, col=col, unit=unit, alt=alt, line=line, solid=solid);
ldraw_lib__6142617r(line=0.2);
